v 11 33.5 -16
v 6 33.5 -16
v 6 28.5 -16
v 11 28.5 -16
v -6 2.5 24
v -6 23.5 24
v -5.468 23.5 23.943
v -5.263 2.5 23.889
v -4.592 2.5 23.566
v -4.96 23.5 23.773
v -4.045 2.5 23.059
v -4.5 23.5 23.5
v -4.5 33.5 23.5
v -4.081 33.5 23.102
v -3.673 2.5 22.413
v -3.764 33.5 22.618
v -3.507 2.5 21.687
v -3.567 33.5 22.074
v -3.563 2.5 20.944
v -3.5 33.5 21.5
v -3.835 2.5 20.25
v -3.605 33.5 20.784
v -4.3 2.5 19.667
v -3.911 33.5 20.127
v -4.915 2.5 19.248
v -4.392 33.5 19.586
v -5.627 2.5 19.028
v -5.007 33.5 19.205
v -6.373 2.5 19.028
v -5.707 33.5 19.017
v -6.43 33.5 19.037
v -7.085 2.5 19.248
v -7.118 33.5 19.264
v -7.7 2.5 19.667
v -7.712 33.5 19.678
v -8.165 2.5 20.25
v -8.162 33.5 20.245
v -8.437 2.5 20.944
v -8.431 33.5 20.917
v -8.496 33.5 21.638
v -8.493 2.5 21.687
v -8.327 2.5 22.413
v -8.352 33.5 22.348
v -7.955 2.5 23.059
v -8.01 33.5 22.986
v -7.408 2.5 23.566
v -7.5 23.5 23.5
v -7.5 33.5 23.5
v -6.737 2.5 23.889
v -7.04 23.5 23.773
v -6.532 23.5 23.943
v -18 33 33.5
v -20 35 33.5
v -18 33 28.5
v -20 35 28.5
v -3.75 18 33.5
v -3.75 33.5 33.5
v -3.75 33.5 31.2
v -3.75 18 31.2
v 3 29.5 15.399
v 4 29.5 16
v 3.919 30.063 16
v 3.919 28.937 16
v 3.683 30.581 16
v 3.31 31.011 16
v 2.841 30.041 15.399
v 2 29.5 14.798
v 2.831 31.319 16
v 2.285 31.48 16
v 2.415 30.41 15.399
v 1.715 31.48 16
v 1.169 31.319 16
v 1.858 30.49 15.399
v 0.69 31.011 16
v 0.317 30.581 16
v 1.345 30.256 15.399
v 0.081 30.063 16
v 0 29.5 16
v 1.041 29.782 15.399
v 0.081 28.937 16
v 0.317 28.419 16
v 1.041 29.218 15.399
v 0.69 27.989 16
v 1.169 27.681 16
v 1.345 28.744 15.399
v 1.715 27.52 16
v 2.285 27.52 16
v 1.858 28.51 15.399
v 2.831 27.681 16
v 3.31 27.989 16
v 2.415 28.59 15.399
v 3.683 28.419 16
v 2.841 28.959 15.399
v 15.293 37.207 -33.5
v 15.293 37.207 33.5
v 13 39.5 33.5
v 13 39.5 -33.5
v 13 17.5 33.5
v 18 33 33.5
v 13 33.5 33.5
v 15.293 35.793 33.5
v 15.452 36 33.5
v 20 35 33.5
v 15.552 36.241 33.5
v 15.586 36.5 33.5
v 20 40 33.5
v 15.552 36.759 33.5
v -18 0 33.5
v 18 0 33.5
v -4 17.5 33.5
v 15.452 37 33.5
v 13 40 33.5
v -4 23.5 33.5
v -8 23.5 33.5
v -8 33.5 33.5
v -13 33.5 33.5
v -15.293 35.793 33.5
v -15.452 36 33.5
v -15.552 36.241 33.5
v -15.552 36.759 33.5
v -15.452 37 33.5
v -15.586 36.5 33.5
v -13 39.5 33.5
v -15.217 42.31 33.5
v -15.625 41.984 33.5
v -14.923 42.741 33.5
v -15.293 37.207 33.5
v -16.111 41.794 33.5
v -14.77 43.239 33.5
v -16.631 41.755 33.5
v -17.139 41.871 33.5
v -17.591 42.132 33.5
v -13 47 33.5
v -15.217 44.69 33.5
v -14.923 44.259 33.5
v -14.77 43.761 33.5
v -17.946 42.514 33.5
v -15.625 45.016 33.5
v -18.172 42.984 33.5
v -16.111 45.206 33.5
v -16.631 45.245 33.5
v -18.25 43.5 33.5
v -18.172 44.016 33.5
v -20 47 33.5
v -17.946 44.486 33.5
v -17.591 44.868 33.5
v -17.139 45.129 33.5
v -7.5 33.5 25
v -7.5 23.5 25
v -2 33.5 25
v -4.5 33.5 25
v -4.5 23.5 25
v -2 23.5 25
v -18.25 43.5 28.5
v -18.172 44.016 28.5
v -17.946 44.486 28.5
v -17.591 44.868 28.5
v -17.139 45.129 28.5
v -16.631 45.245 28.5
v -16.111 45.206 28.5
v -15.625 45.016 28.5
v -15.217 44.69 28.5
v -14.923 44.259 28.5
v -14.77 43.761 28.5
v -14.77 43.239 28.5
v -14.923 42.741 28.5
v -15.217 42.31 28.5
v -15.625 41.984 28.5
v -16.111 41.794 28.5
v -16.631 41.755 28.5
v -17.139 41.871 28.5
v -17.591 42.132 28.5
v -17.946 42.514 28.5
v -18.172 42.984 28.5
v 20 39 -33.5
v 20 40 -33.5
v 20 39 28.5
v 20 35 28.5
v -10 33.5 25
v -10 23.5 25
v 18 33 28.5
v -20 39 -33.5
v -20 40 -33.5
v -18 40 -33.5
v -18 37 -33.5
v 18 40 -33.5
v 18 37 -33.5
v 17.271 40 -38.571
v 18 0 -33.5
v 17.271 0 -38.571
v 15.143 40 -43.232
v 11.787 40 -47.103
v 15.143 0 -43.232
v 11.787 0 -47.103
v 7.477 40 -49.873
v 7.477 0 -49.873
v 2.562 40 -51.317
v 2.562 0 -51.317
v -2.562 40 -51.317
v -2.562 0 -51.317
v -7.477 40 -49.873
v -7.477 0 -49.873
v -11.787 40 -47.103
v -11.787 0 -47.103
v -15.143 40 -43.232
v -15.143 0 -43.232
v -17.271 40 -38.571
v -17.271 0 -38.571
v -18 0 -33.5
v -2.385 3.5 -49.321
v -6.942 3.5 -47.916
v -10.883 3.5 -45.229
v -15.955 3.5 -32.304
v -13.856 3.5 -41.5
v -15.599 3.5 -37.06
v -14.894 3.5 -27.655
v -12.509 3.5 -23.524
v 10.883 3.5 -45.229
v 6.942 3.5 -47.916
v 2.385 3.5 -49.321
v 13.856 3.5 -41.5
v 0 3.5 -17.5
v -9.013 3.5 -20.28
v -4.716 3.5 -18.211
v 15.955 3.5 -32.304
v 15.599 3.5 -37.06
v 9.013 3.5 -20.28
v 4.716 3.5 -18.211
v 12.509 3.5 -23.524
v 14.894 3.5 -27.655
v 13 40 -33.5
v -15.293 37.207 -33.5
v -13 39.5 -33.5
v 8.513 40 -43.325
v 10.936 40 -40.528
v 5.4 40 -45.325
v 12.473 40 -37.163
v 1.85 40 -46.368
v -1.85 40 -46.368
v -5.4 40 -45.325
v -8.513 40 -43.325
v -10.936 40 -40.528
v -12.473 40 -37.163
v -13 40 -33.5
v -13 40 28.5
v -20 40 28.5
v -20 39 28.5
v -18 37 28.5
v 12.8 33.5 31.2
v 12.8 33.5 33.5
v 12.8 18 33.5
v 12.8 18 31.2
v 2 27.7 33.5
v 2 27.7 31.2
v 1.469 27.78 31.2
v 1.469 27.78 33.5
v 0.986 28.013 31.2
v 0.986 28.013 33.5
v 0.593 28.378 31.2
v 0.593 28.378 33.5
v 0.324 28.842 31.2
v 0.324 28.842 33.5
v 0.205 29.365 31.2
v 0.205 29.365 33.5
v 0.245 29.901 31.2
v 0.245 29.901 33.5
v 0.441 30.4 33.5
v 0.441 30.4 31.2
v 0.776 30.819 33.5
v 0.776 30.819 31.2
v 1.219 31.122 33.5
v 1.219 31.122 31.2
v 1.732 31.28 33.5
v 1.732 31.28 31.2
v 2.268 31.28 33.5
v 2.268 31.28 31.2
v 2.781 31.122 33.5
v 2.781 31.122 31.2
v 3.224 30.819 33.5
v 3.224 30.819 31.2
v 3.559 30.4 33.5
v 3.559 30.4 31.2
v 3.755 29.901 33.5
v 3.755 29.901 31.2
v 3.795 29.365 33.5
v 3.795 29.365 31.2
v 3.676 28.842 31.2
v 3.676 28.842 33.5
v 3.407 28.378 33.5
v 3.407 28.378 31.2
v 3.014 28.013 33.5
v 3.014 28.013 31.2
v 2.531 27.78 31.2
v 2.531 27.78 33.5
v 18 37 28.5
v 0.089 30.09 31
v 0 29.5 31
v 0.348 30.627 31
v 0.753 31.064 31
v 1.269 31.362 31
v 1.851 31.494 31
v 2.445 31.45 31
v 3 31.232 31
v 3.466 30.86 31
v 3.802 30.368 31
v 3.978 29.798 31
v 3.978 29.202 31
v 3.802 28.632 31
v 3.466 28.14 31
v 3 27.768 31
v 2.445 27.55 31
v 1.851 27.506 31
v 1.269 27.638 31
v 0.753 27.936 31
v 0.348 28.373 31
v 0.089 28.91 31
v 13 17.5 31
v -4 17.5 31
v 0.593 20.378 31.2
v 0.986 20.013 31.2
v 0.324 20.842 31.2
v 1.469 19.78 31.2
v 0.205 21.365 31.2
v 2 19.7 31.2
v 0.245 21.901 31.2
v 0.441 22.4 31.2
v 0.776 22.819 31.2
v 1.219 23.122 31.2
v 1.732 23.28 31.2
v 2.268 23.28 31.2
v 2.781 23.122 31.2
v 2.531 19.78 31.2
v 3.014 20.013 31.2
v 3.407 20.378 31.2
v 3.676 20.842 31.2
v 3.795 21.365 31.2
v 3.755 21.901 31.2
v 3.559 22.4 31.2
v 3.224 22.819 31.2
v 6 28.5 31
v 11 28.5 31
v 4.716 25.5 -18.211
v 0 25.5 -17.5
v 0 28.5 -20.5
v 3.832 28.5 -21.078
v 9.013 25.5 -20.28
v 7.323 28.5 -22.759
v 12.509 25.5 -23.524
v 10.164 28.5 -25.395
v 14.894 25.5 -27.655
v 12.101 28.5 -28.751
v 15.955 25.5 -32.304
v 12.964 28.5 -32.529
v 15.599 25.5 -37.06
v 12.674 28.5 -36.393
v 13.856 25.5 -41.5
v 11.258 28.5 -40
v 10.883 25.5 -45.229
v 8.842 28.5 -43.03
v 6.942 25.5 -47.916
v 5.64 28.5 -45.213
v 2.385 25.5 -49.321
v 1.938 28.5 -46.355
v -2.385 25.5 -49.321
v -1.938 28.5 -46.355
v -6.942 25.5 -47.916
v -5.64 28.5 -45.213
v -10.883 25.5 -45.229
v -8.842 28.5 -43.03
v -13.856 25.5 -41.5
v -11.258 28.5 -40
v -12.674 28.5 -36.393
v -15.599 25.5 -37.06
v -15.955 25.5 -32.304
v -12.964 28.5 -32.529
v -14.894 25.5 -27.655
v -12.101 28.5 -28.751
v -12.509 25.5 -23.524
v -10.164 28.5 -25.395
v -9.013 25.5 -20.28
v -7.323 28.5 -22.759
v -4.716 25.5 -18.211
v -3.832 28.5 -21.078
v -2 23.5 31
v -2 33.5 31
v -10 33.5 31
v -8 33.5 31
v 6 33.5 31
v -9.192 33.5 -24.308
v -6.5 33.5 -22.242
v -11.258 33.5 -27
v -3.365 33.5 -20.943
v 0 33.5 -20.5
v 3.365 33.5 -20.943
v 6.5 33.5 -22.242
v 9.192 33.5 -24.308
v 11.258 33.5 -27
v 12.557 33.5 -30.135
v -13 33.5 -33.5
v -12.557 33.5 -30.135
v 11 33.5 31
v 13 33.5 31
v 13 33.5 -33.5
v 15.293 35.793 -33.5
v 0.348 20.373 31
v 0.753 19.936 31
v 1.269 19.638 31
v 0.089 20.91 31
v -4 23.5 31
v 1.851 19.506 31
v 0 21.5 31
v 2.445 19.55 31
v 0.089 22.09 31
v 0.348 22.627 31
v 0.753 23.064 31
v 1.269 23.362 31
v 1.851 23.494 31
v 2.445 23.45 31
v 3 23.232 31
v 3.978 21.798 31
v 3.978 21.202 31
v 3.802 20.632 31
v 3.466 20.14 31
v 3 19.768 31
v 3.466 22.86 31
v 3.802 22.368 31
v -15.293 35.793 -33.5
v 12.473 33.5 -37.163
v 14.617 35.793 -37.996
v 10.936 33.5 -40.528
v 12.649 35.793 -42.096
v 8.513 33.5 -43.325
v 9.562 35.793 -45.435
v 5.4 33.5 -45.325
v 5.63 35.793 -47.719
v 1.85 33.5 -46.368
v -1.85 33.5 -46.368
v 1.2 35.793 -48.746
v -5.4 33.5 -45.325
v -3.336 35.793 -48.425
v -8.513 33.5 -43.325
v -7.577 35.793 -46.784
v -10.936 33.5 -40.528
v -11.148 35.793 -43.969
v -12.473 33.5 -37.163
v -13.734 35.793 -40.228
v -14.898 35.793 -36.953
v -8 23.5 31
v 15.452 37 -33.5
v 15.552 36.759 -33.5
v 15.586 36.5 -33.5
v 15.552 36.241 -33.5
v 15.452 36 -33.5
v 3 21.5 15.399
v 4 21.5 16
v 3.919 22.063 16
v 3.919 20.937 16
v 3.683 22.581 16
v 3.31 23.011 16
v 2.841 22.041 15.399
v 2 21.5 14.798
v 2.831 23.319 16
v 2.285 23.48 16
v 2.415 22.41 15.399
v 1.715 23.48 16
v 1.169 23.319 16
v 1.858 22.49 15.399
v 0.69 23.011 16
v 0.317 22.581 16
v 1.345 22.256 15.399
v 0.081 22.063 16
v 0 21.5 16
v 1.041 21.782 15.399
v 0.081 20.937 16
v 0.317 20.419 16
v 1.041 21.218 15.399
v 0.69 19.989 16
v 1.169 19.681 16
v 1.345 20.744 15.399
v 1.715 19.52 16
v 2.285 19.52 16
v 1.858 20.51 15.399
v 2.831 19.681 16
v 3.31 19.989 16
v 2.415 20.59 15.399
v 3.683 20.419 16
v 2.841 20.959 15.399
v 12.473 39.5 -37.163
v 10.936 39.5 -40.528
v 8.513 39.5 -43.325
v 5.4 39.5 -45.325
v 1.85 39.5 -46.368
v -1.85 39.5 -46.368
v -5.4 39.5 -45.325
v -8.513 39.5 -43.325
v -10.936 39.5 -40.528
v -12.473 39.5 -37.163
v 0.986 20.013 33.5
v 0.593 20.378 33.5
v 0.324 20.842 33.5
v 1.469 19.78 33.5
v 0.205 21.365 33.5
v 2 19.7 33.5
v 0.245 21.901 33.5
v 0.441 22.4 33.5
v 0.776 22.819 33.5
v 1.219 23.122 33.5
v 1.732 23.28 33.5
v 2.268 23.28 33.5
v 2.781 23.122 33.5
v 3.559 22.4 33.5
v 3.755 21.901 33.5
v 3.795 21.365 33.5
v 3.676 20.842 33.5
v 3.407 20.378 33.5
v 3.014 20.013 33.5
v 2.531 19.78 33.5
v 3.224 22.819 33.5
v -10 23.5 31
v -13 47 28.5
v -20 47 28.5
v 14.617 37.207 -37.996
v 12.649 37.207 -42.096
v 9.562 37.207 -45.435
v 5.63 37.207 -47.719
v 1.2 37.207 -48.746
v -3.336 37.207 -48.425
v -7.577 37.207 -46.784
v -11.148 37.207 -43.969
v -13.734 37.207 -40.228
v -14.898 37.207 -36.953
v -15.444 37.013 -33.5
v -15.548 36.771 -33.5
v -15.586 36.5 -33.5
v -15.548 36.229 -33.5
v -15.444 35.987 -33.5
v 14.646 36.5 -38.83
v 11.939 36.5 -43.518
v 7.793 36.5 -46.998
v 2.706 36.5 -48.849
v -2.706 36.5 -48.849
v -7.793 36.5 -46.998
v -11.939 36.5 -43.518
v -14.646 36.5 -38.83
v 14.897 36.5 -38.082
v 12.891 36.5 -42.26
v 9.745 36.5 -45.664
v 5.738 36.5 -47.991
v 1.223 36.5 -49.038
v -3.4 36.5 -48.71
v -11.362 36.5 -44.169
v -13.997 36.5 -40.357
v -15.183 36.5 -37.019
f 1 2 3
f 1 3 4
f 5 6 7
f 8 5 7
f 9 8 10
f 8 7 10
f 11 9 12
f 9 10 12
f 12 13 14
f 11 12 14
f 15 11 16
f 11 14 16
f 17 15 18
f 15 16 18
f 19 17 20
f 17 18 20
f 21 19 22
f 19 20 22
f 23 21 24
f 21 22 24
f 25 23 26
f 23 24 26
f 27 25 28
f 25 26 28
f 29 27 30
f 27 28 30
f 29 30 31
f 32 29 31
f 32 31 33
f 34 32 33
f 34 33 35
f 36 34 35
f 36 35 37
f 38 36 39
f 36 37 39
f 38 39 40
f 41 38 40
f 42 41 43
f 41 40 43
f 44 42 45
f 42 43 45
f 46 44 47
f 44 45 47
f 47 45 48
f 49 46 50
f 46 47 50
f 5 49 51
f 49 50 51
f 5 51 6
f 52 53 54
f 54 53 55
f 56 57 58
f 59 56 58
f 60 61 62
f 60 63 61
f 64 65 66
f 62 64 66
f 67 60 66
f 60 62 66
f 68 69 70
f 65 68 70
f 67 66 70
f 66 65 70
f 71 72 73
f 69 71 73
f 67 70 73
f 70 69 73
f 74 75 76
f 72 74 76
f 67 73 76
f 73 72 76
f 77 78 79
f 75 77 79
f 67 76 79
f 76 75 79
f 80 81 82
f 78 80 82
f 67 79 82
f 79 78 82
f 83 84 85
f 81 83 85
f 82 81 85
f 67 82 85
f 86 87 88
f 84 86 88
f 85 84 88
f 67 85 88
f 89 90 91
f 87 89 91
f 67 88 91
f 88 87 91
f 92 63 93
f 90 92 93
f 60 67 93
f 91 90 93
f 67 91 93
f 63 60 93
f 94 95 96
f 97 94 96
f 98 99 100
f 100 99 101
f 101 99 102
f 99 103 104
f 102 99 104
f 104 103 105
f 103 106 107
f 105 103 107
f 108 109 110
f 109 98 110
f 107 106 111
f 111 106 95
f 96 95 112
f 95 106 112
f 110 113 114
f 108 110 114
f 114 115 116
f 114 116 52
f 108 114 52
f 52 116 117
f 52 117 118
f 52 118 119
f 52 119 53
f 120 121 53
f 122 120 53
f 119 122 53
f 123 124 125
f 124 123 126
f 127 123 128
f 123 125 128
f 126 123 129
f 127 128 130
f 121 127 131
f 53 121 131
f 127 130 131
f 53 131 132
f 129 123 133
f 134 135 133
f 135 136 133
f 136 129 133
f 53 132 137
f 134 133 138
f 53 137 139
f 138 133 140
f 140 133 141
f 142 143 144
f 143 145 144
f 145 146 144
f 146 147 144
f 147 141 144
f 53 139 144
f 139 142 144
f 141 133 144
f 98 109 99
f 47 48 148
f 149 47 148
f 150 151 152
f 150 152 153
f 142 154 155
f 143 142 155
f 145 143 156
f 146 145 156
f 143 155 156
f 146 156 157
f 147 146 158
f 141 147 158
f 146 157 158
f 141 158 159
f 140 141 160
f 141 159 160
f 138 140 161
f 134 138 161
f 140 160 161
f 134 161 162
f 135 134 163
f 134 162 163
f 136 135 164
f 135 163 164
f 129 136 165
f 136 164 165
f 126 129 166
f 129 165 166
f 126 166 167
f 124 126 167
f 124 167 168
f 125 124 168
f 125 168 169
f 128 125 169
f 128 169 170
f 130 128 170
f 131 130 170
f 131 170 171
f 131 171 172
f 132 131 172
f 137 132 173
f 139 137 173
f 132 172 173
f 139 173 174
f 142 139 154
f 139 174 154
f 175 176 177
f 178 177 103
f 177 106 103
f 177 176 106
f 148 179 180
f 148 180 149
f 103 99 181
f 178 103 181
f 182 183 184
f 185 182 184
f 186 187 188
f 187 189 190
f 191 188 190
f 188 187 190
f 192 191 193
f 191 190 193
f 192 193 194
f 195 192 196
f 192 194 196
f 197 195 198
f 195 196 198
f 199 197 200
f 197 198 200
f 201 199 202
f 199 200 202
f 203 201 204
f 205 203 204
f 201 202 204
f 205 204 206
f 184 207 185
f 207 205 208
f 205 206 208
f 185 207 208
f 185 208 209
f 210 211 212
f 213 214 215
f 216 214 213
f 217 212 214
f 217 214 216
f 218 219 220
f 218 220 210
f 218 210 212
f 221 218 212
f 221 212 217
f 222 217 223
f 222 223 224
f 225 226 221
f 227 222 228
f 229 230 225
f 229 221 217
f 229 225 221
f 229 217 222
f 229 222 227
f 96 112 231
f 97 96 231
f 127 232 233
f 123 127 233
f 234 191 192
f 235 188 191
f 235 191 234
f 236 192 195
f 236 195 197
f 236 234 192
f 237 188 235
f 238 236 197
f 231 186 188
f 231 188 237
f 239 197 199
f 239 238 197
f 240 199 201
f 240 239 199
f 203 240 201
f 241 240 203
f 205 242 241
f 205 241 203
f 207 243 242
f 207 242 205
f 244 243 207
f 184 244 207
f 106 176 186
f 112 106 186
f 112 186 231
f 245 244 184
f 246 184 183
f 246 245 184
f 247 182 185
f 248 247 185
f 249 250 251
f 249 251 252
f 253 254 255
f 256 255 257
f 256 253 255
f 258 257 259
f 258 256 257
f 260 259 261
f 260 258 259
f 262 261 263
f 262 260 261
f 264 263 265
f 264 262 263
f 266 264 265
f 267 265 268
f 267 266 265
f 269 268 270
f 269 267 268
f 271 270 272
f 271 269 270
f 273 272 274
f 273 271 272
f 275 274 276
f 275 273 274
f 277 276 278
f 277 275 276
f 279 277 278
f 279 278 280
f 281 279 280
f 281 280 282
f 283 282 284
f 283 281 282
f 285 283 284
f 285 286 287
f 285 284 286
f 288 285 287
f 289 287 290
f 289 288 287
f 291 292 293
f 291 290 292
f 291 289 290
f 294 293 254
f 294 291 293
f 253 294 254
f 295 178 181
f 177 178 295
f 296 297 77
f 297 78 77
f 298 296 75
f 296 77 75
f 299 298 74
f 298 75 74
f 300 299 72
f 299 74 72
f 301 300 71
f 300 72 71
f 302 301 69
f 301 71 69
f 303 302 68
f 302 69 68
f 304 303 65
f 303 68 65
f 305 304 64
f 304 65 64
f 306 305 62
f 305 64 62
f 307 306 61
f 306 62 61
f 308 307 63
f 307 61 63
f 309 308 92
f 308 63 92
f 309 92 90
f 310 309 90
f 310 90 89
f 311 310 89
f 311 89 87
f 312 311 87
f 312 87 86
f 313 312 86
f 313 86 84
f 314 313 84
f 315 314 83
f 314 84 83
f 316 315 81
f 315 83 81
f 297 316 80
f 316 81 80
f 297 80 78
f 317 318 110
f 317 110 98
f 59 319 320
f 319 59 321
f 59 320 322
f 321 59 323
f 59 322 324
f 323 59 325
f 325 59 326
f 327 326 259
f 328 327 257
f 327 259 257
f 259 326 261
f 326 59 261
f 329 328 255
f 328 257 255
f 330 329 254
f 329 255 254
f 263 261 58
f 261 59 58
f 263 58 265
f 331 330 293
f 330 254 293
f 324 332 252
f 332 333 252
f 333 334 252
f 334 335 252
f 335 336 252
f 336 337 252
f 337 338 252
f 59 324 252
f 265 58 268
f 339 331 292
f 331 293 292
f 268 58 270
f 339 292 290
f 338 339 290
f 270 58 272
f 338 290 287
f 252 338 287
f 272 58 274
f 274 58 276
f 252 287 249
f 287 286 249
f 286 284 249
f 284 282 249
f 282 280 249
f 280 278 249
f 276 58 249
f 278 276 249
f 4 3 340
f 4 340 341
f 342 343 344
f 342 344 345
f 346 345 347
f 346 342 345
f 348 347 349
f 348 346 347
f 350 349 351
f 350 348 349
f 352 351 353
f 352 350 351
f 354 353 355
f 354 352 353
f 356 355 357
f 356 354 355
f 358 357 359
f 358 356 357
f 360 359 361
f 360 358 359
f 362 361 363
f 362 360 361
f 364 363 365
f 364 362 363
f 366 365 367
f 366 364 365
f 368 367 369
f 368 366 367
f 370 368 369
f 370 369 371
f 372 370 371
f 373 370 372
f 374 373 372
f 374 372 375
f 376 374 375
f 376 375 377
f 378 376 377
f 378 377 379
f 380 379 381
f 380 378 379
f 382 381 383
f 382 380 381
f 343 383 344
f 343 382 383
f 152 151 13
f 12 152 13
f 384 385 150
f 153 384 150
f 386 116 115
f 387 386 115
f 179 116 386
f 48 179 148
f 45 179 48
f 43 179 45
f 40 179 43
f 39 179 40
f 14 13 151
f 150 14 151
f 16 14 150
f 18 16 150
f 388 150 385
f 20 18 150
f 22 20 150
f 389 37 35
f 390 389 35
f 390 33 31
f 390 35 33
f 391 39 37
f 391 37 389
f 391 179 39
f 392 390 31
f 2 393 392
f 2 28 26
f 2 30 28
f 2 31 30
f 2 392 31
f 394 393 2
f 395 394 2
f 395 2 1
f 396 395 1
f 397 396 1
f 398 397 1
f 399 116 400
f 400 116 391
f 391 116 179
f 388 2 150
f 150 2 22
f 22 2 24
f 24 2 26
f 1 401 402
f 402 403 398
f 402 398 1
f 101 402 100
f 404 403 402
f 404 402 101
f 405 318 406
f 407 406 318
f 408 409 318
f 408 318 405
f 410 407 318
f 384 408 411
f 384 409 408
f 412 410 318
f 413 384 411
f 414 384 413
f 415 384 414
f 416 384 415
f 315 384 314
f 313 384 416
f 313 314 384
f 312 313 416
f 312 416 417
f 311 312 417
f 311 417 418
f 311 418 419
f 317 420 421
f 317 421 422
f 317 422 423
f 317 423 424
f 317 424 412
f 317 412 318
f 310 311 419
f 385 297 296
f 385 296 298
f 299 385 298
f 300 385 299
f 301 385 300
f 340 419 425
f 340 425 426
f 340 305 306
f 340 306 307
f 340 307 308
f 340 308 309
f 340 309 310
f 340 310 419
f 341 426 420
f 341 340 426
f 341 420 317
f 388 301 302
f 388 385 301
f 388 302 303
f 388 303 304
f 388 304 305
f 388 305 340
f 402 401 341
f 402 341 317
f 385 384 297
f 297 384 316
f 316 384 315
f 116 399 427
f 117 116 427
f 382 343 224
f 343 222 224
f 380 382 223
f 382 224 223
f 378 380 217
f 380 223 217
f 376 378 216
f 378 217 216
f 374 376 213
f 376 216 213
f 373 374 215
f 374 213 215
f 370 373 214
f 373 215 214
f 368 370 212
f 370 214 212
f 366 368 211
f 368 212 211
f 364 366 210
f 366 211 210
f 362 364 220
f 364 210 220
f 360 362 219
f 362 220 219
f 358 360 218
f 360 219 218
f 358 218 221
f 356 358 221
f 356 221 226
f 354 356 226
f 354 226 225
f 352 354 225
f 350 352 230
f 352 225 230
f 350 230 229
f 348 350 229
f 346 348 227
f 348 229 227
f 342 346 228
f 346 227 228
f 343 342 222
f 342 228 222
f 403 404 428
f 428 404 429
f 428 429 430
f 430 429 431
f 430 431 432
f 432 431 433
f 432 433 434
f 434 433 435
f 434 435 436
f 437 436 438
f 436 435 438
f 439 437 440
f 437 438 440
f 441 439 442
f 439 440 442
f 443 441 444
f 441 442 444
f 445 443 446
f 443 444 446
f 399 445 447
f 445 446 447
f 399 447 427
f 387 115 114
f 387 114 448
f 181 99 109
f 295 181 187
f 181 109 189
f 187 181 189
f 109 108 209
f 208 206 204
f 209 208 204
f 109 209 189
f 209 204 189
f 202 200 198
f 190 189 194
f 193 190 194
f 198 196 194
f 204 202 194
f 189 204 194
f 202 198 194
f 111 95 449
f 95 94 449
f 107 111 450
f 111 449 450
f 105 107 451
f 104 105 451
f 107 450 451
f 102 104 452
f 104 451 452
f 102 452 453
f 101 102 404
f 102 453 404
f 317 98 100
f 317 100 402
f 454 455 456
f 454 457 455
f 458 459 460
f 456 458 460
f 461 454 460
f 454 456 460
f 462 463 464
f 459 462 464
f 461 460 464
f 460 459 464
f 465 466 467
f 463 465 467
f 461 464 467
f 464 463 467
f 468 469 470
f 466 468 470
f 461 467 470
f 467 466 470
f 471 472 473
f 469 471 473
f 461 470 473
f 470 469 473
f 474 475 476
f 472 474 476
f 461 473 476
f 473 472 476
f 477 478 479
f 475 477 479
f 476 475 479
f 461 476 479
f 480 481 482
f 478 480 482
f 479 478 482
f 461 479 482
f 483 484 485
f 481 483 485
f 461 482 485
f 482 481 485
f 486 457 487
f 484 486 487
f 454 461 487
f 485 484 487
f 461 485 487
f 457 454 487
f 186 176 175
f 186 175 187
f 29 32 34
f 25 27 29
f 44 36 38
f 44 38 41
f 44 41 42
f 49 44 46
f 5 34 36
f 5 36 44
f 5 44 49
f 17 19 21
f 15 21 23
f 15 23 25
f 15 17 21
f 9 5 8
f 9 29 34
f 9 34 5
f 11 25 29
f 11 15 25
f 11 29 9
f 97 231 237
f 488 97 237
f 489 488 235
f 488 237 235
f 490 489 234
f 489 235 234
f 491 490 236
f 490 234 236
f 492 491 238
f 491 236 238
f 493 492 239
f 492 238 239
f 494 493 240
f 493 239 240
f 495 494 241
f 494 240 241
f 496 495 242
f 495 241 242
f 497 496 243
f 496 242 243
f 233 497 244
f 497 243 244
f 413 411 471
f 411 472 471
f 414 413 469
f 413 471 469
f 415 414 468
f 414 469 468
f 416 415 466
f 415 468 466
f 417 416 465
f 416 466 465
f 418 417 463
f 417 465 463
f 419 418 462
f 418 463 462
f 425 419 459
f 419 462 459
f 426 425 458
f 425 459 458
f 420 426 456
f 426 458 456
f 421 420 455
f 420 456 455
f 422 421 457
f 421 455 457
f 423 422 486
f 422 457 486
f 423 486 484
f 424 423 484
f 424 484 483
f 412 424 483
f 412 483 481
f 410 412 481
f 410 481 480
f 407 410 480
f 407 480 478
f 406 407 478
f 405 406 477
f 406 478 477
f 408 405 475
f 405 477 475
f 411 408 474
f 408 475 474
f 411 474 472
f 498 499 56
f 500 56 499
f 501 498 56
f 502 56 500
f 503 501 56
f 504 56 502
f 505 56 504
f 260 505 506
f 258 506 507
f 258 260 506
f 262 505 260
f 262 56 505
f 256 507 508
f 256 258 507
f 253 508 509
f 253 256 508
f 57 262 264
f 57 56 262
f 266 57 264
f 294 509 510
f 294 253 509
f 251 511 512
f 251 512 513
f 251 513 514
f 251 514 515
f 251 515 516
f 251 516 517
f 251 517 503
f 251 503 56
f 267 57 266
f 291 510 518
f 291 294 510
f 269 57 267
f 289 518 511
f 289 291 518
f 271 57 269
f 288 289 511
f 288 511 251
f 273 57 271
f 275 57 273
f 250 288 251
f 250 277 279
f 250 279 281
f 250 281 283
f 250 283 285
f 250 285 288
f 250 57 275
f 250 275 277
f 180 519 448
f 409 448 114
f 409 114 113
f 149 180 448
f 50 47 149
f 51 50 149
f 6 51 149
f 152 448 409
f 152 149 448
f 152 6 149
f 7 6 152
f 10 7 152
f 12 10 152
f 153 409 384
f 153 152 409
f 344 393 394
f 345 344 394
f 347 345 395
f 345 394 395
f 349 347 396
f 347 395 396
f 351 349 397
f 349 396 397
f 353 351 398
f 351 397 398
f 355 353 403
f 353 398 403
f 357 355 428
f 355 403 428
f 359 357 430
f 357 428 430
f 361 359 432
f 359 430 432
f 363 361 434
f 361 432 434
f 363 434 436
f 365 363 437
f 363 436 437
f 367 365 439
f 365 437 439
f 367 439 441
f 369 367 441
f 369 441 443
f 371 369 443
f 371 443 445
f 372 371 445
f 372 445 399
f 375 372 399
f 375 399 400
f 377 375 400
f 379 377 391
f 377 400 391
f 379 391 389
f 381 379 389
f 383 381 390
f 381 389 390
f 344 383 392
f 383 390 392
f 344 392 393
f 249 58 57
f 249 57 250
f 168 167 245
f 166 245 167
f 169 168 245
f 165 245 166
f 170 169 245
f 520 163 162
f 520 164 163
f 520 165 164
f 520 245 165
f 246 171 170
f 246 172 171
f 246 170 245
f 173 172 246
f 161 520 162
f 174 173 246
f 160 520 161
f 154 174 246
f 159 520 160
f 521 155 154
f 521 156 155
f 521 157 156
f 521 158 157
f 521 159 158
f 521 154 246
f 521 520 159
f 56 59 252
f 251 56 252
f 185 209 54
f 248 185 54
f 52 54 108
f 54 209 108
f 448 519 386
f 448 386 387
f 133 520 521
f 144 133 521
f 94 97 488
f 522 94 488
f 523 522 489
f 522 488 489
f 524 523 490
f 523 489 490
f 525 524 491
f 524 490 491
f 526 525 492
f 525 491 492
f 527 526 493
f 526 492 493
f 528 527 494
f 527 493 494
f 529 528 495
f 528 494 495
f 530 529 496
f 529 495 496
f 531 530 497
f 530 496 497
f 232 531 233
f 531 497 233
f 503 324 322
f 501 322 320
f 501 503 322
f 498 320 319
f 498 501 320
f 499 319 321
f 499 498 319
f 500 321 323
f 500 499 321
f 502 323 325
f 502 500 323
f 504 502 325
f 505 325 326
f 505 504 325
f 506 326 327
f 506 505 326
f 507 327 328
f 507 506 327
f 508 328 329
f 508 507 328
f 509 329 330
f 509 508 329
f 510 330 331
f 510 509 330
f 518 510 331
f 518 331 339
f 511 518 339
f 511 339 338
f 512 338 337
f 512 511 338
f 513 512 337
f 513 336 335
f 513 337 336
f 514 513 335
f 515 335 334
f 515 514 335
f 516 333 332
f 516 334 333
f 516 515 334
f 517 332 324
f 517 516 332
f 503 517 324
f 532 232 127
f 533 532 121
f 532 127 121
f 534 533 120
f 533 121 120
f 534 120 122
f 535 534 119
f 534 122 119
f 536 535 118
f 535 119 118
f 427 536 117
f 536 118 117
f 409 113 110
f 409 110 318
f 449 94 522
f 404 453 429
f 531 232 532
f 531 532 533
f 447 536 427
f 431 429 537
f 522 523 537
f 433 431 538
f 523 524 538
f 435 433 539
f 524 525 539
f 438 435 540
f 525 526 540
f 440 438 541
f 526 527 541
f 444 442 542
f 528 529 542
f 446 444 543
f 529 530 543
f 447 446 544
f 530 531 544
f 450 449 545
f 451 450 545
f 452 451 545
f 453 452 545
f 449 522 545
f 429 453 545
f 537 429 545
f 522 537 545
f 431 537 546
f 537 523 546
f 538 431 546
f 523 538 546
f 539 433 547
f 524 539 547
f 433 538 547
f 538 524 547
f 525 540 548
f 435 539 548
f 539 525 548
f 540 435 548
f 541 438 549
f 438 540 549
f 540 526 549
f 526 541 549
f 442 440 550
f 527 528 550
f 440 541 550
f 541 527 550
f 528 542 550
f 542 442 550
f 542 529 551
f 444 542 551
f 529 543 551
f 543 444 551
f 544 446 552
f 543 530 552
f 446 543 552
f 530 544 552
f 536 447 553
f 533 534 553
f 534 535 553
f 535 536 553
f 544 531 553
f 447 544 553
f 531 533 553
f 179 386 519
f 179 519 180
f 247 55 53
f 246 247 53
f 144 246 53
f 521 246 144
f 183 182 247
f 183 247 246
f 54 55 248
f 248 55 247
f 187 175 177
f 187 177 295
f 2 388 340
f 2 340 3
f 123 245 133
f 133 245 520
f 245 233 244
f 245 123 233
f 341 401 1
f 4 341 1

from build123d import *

# Parameters (mm, degrees)
DODANIE_WYCI_GNI_CIE1_DEPTH         = 40
WYTNIJ_WYCI_GNI_CIE1_DEPTH          = 6.5
SZKIC6_R                            = 13
WYTNIJ_WYCI_GNI_CIE2_DEPTH          = 30
SZKIC7_R                            = 16
WYTNIJ_WYCI_GNI_CIE4_DEPTH          = 20
SFAZOWANIE1_SIZE                    = 5
SZKIC8_W                            = 5
SZKIC8_H                            = 47
WYTNIJ_WYCI_GNI_CIE5_DEPTH          = 5
ZAOKR_GLENIE2_R                     = 1
SZKIC10_W                           = 8
SZKIC10_H                           = 6
WYTNIJ_WYCI_GNI_CIE6_DEPTH          = 10
SZKIC26_R                           = 2.5
WYTNIJ_WYCI_GNI_CIE10_DEPTH         = 21
SZKIC12_W                           = 4
SZKIC12_H                           = 2.5
WYTNIJ_WYCI_GNI_CIE8_DEPTH          = 10
DODANIE_WYCI_GNI_CIE2_DEPTH         = 67
SZKIC17_W                           = 17
SZKIC17_H                           = 2.5
WYTNIJ_WYCI_GNI_CIE9_DEPTH          = 16
OTWORY_USTALAJ_CE_4_0MM5_D          = 4
OTWORY_USTALAJ_CE_4_0MM5_DEPTH      = 15
OTWORY_USTALAJ_CE_4_0MM5_TIP        = 1.201721238
SZKIC23_W                           = 16.55
SZKIC23_H                           = 2.3
DODANIE_WYCI_GNI_CIE4_DEPTH         = 15.5
OTWORY_USTALAJ_CE_4_0MM6_AT_2_COUNT = 2
OTWORY_USTALAJ_CE_4_0MM6_AT_2_PITCH = 8
DODANIE_WYCI_GNI_CIE5_DEPTH         = 5
SFAZOWANIE2_SIZE                    = 2
SZKIC29_W                           = 7
SZKIC29_H                           = 7
SZKIC29_R                           = 1.75
DODANIE_WYCI_GNI_CIE6_DEPTH         = 5


# Some blends are built 0.0001 mm under size
with BuildPart() as part:
    # Szkic1 → Dodanie-wyciągnięcie1 (new body)
    with BuildSketch(Plane(origin=(0, 0, 0), x_dir=(1, 0, 0), z_dir=(0, 1, 0))):
        with BuildLine():
            ThreePointArc((18, 33.5), (0, 15.5), (-18, 33.5))
            Line((-18, 33.5), (-18, -33.5))
            Line((-18, -33.5), (18, -33.5))
            Line((18, -33.5), (18, 33.5))
        make_face()
        with BuildLine():
            ThreePointArc((18, 33.5), (0, 51.5), (-18, 33.5))
            Line((-18, 33.5), (18, 33.5))
        make_face()
        with BuildLine():
            Line((18, 33.5), (-18, 33.5))
            ThreePointArc((-18, 33.5), (0, 15.5), (18, 33.5))
        make_face()
    extrude(amount=DODANIE_WYCI_GNI_CIE1_DEPTH)

    # Szkic2 → Wytnij-wyciągnięcie1 (cut)
    with BuildSketch(Plane(origin=(0, 40, 0), x_dir=(1, 0, 0), z_dir=(0, 1, 0))):
        with BuildLine():
            Line((-13, -33.5), (13, -33.5))
            Line((13, -33.5), (13, 33.5))
            ThreePointArc((13, 33.5), (0, 46.5), (-13, 33.5))
            Line((-13, 33.5), (-13, -33.5))
        make_face()
    extrude(amount=-WYTNIJ_WYCI_GNI_CIE1_DEPTH, mode=Mode.SUBTRACT)

    # Wycięcie-wyciągnięcie po ścieżce1: sweep along a path in Szkic5
    with BuildLine(Plane(origin=(0, 40, 0), x_dir=(1, 0, 0), z_dir=(0, 1, 0))) as wyci_cie_wyci_gni_cie_po_cie_ce1_path:
        Line((13, -33.5), (13, 33.5))
        ThreePointArc((13, 33.5), (0, 46.5), (-13, 33.5))
        Line((-13, 33.5), (-13, -33.5))
    # Szkic4 → Wycięcie-wyciągnięcie po ścieżce1 (sweep, cut)
    with BuildSketch(Plane.XY.offset(33.5)):
        Polygon((13, 33.5), (16, 36.5), (13, 39.5), align=None)
    sweep(path=wyci_cie_wyci_gni_cie_po_cie_ce1_path.line, mode=Mode.SUBTRACT)

    # Szkic6 → Wytnij-wyciągnięcie2 (cut)
    with BuildSketch(Plane(origin=(0, 33.5, 0), x_dir=(1, 0, 0), z_dir=(0, 1, 0))):
        with Locations(Location((0, 33.5, 0), (0, 0, 270))):
            Circle(SZKIC6_R)
    extrude(amount=-WYTNIJ_WYCI_GNI_CIE2_DEPTH, mode=Mode.SUBTRACT)

    # Szkic7 → Wytnij-wyciągnięcie4 (cut)
    with BuildSketch(Plane(origin=(0, 3.5, 0), x_dir=(1, 0, 0), z_dir=(0, 1, 0))):
        with Locations(Location((0, 33.5, 0), (0, 0, 270))):
            Circle(SZKIC7_R)
    extrude(amount=WYTNIJ_WYCI_GNI_CIE4_DEPTH, mode=Mode.SUBTRACT)

    # Sfazowanie1
    # the kernel refuses this chamfer: 5 mm, written as the material it takes off along each edge
    with BuildSketch(Plane(origin=(0, 23.5, -33.5), x_dir=(0, 0, 1), z_dir=(-1, 0, 0))) as sfazowanie1_piece_1_section:
        Polygon((13, SFAZOWANIE1_SIZE), (13 + SFAZOWANIE1_SIZE, 0), (13, 0), align=None)
    sfazowanie1_piece_1 = revolve(axis=Axis((0, 23.5, -33.5), (0, 1, 0)), mode=Mode.PRIVATE)
    sfazowanie1_piece_1 = sfazowanie1_piece_1 & Plane(origin=(0, 26.999564764, -33.5), x_dir=(0, 0, 1), z_dir=(0, -1, 0)) * Cylinder(16, 72, mode=Mode.PRIVATE)
    add(sfazowanie1_piece_1, mode=Mode.SUBTRACT)

    # Szkic8 → Wytnij-wyciągnięcie5 (cut)
    with BuildSketch(Plane(origin=(0, 33.5, 0), x_dir=(1, 0, 0), z_dir=(0, 1, 0))):
        with Locations((8.5, -7.5)):
            Rectangle(SZKIC8_W, SZKIC8_H)
    extrude(amount=-WYTNIJ_WYCI_GNI_CIE5_DEPTH, mode=Mode.SUBTRACT)

    # Zaokrąglenie2
    zaokr_glenie2_edges = [part.edges().sort_by_distance(p)[0] for p in [
        (16, 36.5, 0),
        (0, 36.5, -49.5),
        (-16, 36.5, 0),
    ]]
    fillet(zaokr_glenie2_edges, radius=ZAOKR_GLENIE2_R)

    # Szkic10 → Wytnij-wyciągnięcie6 (cut)
    with BuildSketch(Plane(origin=(0, 33.5, 0), x_dir=(1, 0, 0), z_dir=(0, 1, 0))):
        with Locations((-6, -28)):
            Rectangle(SZKIC10_W, SZKIC10_H)
        with BuildLine():
            ThreePointArc((-7.5, -23.5), (-6, -24), (-4.5, -23.5))
            Line((-4.5, -23.5), (-7.5, -23.5))
        make_face()
        with BuildLine():
            Line((-7.5, -23.5), (-4.5, -23.5))
            ThreePointArc((-4.5, -23.5), (-3.763932023, -22.618033989), (-3.5, -21.5))
            ThreePointArc((-3.5, -21.5), (-7.118033989, -19.263932023), (-7.5, -23.5))
        make_face()
        with BuildLine():
            Line((-7.5, -25), (-4.5, -25))
            Line((-4.5, -25), (-4.5, -23.5))
            ThreePointArc((-4.5, -23.5), (-6, -24), (-7.5, -23.5))
            Line((-7.5, -23.5), (-7.5, -25))
        make_face()
    extrude(amount=-WYTNIJ_WYCI_GNI_CIE6_DEPTH, mode=Mode.SUBTRACT)

    # Szkic26 → Wytnij-wyciągnięcie10 (cut)
    with BuildSketch(Plane(origin=(0, 23.5, 0), x_dir=(1, 0, 0), z_dir=(0, 1, 0))):
        with Locations(Location((-6, -21.5, 0), (0, 0, 270))):
            Circle(SZKIC26_R)
    extrude(amount=-WYTNIJ_WYCI_GNI_CIE10_DEPTH, mode=Mode.SUBTRACT)

    # Szkic12 → Wytnij-wyciągnięcie8 (cut)
    with BuildSketch(Plane(origin=(0, 33.5, 0), x_dir=(1, 0, 0), z_dir=(0, 1, 0))):
        with Locations((-6, -32.25)):
            Rectangle(SZKIC12_W, SZKIC12_H)
    extrude(amount=-WYTNIJ_WYCI_GNI_CIE8_DEPTH, mode=Mode.SUBTRACT)

    # Szkic13 → Dodanie-wyciągnięcie2 (add)
    with BuildSketch(Plane.XY.offset(33.5)):
        Polygon((-18, 40), (-20, 40), (-20, 39), (-18, 37), align=None)
        Polygon((18, 37), (18, 40), (20, 40), (20, 39), align=None)
    extrude(amount=-DODANIE_WYCI_GNI_CIE2_DEPTH)

    # Szkic17 → Wytnij-wyciągnięcie9 (cut)
    with BuildSketch(Plane(origin=(0, 33.5, 0), x_dir=(1, 0, 0), z_dir=(0, 1, 0))):
        with Locations((4.5, -32.25)):
            Rectangle(SZKIC17_W, SZKIC17_H)
    extrude(amount=-WYTNIJ_WYCI_GNI_CIE9_DEPTH, mode=Mode.SUBTRACT)

    # Otwory ustalające Ø4.0mm5
    with Locations(Plane.XY.offset(31)):
        with Locations((2, 29.5), (2, 21.5)):
            Hole(OTWORY_USTALAJ_CE_4_0MM5_D / 2, depth=OTWORY_USTALAJ_CE_4_0MM5_DEPTH)
            with Locations((0, 0, -(OTWORY_USTALAJ_CE_4_0MM5_DEPTH + OTWORY_USTALAJ_CE_4_0MM5_TIP / 2))):  # 118° drill point
                Cone(0, OTWORY_USTALAJ_CE_4_0MM5_D / 2, OTWORY_USTALAJ_CE_4_0MM5_TIP, mode=Mode.SUBTRACT)

    # Szkic27 → Dodanie-wyciągnięcie5 (add)
    with BuildSketch(Plane.XY.offset(33.5)):
        Polygon((-20, 39), (-20, 35), (-18, 35), (-18, 37), align=None)
        Polygon((18, 37), (20, 39), (20, 35), (18, 35), align=None)
    extrude(amount=-DODANIE_WYCI_GNI_CIE5_DEPTH)

    # Sfazowanie2
    sfazowanie2_edges = [part.edges().sort_by_distance(p)[0] for p in [
        (18, 35, 31),
        (-18, 35, 31),
    ]]
    chamfer(sfazowanie2_edges, length=SFAZOWANIE2_SIZE - 0.0001)  # a hair under: the kernel refuses the full size

    # Szkic29 → Dodanie-wyciągnięcie6 (add)
    with BuildSketch(Plane(origin=(0, 0, 28.5), x_dir=(-1, 0, 0), z_dir=(0, 0, -1))):
        with Locations((16.5, 43.5)):
            Rectangle(SZKIC29_W, SZKIC29_H)
        with Locations((16.5, 43.5)):
            Circle(SZKIC29_R, mode=Mode.SUBTRACT)
    extrude(amount=-DODANIE_WYCI_GNI_CIE6_DEPTH)


with BuildPart() as body_2:
    # Szkic23 → Dodanie-wyciągnięcie4 (new body)
    with BuildSketch(Plane(origin=(0, 33.5, 0), x_dir=(1, 0, 0), z_dir=(0, 1, 0))):
        with Locations((4.525, -32.35)):
            Rectangle(SZKIC23_W, SZKIC23_H)
    extrude(amount=-DODANIE_WYCI_GNI_CIE4_DEPTH)

    # Szkic25 → Otwory ustalające Ø4.0mm6 (revolve, cut)
    with BuildSketch(Plane(origin=(2, 21.5, 33.5), x_dir=(0, -1, 0), z_dir=(1, 0, 0))):
        Polygon((0, 0), (0, 16.081549114), (1.8, 15), (1.8, 0), align=None)
    otwory_ustalaj_ce_4_0mm6 = revolve(axis=Axis((2, 21.5, 39.85), (0, 0, -1)), mode=Mode.SUBTRACT)

    # Otwory ustalające Ø4.0mm6 at 2: Otwory ustalające Ø4.0mm6 ×2
    with Locations(*[(0, i * OTWORY_USTALAJ_CE_4_0MM6_AT_2_PITCH, 0) for i in range(1, OTWORY_USTALAJ_CE_4_0MM6_AT_2_COUNT)]):
        add(otwory_ustalaj_ce_4_0mm6, mode=Mode.SUBTRACT)


solid = Compound([part.part, body_2.part])
